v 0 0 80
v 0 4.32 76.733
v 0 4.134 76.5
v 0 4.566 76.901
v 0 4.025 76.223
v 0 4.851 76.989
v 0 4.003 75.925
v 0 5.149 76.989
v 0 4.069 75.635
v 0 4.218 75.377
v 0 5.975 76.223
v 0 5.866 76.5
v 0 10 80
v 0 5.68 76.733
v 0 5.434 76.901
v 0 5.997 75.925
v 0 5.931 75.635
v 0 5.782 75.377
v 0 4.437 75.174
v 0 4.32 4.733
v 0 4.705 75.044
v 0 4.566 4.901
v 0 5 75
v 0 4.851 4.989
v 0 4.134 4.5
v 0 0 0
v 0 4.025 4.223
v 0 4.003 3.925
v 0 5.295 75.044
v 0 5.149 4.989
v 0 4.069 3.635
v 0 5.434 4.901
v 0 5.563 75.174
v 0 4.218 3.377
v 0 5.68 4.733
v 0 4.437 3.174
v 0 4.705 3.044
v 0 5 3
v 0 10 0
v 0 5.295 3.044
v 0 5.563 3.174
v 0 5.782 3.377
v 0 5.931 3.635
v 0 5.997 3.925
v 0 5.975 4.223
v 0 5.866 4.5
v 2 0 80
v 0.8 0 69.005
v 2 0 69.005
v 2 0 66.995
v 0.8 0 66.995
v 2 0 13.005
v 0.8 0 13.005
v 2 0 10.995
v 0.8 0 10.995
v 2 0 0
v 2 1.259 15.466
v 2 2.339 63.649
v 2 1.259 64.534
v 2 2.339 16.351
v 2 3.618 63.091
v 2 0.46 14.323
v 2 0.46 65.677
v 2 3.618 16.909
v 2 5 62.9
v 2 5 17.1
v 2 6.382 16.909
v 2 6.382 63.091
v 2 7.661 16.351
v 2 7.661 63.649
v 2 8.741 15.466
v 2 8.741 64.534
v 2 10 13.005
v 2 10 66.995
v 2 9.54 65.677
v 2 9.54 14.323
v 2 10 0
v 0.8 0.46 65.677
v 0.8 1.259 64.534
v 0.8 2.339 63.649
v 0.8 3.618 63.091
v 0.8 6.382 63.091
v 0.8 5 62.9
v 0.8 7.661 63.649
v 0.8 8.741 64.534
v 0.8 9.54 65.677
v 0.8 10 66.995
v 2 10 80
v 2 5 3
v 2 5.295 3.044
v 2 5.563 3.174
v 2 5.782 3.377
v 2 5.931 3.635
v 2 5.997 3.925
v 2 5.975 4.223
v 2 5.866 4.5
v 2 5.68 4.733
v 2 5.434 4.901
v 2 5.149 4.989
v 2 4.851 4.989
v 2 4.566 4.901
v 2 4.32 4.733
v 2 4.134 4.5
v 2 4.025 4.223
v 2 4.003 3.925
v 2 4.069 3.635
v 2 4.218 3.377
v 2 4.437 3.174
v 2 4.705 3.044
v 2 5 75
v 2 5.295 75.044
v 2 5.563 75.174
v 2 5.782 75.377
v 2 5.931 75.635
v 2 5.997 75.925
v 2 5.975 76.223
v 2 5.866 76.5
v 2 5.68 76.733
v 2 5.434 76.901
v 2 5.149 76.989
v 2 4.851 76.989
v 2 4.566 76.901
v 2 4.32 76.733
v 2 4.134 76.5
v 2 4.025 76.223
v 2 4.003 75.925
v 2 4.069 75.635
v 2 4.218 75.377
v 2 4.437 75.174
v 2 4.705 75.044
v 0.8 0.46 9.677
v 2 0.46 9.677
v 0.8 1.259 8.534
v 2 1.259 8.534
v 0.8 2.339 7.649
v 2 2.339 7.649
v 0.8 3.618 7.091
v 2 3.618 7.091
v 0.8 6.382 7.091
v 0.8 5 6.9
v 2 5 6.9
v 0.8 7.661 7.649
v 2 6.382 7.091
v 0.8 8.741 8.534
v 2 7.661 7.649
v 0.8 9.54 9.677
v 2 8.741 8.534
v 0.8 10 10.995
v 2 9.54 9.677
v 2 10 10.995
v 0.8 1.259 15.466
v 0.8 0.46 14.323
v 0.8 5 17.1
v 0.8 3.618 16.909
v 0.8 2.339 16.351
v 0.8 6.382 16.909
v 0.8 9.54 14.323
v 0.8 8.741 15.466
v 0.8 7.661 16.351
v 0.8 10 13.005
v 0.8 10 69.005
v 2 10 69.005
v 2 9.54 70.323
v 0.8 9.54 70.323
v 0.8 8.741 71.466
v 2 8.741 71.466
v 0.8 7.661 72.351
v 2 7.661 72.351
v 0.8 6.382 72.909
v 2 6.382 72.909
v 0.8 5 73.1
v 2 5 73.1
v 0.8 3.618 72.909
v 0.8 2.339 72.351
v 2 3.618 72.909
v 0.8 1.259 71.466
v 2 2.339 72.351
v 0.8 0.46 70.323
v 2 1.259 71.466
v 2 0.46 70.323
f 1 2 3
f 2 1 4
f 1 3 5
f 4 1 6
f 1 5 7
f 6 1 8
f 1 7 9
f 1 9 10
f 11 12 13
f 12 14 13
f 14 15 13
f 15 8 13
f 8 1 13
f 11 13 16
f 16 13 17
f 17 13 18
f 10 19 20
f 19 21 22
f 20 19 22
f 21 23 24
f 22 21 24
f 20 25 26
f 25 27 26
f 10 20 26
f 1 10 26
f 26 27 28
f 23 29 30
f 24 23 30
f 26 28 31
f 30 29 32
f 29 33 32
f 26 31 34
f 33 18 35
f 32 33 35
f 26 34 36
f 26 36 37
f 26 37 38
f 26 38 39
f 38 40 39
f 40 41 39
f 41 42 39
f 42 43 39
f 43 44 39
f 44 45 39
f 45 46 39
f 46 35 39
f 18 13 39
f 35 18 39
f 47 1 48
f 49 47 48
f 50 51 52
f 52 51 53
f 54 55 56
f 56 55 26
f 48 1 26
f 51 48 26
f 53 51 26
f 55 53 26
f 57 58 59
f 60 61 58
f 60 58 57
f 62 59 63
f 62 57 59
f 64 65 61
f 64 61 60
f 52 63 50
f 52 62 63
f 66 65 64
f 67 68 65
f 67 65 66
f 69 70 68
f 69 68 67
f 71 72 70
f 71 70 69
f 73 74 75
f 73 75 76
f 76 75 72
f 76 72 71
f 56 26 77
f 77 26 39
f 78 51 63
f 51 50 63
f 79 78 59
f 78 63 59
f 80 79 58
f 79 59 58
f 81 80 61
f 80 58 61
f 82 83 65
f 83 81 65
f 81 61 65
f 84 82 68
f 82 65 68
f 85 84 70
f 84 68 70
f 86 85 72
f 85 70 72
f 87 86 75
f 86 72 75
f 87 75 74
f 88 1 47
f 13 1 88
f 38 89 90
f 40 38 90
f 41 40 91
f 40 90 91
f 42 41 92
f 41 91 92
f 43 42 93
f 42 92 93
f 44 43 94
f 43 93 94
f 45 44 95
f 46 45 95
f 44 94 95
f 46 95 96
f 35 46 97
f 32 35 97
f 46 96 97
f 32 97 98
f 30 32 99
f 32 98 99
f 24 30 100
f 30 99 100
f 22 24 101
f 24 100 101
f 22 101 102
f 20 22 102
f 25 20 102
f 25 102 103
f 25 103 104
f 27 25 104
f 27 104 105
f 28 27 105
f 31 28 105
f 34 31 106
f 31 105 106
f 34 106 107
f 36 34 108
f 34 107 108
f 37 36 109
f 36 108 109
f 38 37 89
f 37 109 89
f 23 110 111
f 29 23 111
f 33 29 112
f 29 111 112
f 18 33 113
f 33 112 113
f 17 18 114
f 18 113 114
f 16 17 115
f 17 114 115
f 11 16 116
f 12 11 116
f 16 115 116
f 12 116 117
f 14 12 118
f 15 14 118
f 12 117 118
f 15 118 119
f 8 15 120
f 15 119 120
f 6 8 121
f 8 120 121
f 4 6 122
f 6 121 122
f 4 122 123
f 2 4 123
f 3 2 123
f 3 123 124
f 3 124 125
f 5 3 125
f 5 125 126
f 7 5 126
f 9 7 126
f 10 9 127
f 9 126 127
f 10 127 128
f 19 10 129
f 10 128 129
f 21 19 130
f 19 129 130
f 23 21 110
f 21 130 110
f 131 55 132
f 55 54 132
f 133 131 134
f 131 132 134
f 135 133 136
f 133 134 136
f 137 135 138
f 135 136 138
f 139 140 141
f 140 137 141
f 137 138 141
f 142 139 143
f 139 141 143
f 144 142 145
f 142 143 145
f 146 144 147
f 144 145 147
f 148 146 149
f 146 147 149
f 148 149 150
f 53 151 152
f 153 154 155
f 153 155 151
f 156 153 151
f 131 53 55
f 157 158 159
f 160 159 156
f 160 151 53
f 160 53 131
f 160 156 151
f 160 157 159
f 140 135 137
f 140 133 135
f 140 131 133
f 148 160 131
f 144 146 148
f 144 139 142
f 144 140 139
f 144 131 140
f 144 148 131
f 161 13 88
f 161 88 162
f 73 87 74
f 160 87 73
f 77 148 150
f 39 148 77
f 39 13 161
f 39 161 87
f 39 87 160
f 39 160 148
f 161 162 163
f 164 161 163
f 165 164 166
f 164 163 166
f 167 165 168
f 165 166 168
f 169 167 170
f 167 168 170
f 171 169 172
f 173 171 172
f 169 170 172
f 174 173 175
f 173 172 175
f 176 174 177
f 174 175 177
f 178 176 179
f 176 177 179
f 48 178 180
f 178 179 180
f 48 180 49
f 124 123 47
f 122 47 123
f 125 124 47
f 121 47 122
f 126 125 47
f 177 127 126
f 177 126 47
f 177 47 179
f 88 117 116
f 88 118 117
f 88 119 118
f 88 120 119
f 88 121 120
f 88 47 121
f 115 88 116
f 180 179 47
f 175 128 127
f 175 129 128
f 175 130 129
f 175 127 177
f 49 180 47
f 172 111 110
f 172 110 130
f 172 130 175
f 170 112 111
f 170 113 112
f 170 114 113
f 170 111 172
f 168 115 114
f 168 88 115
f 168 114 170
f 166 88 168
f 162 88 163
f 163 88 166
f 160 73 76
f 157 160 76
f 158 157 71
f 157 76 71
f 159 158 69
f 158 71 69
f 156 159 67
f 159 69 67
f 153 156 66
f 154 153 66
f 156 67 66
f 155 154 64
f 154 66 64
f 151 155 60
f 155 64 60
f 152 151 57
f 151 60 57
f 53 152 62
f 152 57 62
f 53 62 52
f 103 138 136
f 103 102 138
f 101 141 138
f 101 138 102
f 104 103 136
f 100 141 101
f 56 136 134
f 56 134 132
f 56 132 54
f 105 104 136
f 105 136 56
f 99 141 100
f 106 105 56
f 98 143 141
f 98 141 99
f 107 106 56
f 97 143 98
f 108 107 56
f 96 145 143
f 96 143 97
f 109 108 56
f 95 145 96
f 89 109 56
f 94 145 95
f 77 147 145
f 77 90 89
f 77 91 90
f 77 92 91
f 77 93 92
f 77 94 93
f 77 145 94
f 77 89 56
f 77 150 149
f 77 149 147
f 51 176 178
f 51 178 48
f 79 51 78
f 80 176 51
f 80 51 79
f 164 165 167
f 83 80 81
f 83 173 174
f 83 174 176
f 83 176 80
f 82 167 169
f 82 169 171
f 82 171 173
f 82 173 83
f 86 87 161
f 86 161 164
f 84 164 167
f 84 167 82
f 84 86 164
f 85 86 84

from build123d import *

# Parameters (mm, degrees)
SKETCH_1_W          = 80
SKETCH_1_H          = 10
EXTRUDE_1_DEPTH     = 2
SKETCH_2_R          = 1
CUT_EXTRUDE_1_DEPTH = 2
SKETCH_5_R          = 5.1
CUT_EXTRUDE_2_DEPTH = 1.2


with BuildPart() as part:
    # 草图1 → 凸台-拉伸1 (new body)
    with BuildSketch(Plane(origin=(0, 0, 0), x_dir=(0, 0, -1), z_dir=(1, 0, 0))):
        with Locations((-40, 5)):
            Rectangle(SKETCH_1_W, SKETCH_1_H)
    extrude(amount=EXTRUDE_1_DEPTH)

    # 草图2 → 切除-拉伸1 (cut)
    with BuildSketch(Plane(origin=(2, 0, 0), x_dir=(0, 0, -1), z_dir=(1, 0, 0))):
        with Locations((-76, 5)):
            Circle(SKETCH_2_R)
        with Locations((-4, 5)):
            Circle(SKETCH_2_R)
    extrude(amount=-CUT_EXTRUDE_1_DEPTH, mode=Mode.SUBTRACT)

    # 草图5 → 切除-拉伸2 (cut)
    with BuildSketch(Plane(origin=(2, 0, 0), x_dir=(0, 0, -1), z_dir=(1, 0, 0))):
        with Locations((-68, 5)):
            Circle(SKETCH_5_R)
        with Locations((-12, 5)):
            Circle(SKETCH_5_R)
    extrude(amount=-CUT_EXTRUDE_2_DEPTH, mode=Mode.SUBTRACT)


solid = part.part
